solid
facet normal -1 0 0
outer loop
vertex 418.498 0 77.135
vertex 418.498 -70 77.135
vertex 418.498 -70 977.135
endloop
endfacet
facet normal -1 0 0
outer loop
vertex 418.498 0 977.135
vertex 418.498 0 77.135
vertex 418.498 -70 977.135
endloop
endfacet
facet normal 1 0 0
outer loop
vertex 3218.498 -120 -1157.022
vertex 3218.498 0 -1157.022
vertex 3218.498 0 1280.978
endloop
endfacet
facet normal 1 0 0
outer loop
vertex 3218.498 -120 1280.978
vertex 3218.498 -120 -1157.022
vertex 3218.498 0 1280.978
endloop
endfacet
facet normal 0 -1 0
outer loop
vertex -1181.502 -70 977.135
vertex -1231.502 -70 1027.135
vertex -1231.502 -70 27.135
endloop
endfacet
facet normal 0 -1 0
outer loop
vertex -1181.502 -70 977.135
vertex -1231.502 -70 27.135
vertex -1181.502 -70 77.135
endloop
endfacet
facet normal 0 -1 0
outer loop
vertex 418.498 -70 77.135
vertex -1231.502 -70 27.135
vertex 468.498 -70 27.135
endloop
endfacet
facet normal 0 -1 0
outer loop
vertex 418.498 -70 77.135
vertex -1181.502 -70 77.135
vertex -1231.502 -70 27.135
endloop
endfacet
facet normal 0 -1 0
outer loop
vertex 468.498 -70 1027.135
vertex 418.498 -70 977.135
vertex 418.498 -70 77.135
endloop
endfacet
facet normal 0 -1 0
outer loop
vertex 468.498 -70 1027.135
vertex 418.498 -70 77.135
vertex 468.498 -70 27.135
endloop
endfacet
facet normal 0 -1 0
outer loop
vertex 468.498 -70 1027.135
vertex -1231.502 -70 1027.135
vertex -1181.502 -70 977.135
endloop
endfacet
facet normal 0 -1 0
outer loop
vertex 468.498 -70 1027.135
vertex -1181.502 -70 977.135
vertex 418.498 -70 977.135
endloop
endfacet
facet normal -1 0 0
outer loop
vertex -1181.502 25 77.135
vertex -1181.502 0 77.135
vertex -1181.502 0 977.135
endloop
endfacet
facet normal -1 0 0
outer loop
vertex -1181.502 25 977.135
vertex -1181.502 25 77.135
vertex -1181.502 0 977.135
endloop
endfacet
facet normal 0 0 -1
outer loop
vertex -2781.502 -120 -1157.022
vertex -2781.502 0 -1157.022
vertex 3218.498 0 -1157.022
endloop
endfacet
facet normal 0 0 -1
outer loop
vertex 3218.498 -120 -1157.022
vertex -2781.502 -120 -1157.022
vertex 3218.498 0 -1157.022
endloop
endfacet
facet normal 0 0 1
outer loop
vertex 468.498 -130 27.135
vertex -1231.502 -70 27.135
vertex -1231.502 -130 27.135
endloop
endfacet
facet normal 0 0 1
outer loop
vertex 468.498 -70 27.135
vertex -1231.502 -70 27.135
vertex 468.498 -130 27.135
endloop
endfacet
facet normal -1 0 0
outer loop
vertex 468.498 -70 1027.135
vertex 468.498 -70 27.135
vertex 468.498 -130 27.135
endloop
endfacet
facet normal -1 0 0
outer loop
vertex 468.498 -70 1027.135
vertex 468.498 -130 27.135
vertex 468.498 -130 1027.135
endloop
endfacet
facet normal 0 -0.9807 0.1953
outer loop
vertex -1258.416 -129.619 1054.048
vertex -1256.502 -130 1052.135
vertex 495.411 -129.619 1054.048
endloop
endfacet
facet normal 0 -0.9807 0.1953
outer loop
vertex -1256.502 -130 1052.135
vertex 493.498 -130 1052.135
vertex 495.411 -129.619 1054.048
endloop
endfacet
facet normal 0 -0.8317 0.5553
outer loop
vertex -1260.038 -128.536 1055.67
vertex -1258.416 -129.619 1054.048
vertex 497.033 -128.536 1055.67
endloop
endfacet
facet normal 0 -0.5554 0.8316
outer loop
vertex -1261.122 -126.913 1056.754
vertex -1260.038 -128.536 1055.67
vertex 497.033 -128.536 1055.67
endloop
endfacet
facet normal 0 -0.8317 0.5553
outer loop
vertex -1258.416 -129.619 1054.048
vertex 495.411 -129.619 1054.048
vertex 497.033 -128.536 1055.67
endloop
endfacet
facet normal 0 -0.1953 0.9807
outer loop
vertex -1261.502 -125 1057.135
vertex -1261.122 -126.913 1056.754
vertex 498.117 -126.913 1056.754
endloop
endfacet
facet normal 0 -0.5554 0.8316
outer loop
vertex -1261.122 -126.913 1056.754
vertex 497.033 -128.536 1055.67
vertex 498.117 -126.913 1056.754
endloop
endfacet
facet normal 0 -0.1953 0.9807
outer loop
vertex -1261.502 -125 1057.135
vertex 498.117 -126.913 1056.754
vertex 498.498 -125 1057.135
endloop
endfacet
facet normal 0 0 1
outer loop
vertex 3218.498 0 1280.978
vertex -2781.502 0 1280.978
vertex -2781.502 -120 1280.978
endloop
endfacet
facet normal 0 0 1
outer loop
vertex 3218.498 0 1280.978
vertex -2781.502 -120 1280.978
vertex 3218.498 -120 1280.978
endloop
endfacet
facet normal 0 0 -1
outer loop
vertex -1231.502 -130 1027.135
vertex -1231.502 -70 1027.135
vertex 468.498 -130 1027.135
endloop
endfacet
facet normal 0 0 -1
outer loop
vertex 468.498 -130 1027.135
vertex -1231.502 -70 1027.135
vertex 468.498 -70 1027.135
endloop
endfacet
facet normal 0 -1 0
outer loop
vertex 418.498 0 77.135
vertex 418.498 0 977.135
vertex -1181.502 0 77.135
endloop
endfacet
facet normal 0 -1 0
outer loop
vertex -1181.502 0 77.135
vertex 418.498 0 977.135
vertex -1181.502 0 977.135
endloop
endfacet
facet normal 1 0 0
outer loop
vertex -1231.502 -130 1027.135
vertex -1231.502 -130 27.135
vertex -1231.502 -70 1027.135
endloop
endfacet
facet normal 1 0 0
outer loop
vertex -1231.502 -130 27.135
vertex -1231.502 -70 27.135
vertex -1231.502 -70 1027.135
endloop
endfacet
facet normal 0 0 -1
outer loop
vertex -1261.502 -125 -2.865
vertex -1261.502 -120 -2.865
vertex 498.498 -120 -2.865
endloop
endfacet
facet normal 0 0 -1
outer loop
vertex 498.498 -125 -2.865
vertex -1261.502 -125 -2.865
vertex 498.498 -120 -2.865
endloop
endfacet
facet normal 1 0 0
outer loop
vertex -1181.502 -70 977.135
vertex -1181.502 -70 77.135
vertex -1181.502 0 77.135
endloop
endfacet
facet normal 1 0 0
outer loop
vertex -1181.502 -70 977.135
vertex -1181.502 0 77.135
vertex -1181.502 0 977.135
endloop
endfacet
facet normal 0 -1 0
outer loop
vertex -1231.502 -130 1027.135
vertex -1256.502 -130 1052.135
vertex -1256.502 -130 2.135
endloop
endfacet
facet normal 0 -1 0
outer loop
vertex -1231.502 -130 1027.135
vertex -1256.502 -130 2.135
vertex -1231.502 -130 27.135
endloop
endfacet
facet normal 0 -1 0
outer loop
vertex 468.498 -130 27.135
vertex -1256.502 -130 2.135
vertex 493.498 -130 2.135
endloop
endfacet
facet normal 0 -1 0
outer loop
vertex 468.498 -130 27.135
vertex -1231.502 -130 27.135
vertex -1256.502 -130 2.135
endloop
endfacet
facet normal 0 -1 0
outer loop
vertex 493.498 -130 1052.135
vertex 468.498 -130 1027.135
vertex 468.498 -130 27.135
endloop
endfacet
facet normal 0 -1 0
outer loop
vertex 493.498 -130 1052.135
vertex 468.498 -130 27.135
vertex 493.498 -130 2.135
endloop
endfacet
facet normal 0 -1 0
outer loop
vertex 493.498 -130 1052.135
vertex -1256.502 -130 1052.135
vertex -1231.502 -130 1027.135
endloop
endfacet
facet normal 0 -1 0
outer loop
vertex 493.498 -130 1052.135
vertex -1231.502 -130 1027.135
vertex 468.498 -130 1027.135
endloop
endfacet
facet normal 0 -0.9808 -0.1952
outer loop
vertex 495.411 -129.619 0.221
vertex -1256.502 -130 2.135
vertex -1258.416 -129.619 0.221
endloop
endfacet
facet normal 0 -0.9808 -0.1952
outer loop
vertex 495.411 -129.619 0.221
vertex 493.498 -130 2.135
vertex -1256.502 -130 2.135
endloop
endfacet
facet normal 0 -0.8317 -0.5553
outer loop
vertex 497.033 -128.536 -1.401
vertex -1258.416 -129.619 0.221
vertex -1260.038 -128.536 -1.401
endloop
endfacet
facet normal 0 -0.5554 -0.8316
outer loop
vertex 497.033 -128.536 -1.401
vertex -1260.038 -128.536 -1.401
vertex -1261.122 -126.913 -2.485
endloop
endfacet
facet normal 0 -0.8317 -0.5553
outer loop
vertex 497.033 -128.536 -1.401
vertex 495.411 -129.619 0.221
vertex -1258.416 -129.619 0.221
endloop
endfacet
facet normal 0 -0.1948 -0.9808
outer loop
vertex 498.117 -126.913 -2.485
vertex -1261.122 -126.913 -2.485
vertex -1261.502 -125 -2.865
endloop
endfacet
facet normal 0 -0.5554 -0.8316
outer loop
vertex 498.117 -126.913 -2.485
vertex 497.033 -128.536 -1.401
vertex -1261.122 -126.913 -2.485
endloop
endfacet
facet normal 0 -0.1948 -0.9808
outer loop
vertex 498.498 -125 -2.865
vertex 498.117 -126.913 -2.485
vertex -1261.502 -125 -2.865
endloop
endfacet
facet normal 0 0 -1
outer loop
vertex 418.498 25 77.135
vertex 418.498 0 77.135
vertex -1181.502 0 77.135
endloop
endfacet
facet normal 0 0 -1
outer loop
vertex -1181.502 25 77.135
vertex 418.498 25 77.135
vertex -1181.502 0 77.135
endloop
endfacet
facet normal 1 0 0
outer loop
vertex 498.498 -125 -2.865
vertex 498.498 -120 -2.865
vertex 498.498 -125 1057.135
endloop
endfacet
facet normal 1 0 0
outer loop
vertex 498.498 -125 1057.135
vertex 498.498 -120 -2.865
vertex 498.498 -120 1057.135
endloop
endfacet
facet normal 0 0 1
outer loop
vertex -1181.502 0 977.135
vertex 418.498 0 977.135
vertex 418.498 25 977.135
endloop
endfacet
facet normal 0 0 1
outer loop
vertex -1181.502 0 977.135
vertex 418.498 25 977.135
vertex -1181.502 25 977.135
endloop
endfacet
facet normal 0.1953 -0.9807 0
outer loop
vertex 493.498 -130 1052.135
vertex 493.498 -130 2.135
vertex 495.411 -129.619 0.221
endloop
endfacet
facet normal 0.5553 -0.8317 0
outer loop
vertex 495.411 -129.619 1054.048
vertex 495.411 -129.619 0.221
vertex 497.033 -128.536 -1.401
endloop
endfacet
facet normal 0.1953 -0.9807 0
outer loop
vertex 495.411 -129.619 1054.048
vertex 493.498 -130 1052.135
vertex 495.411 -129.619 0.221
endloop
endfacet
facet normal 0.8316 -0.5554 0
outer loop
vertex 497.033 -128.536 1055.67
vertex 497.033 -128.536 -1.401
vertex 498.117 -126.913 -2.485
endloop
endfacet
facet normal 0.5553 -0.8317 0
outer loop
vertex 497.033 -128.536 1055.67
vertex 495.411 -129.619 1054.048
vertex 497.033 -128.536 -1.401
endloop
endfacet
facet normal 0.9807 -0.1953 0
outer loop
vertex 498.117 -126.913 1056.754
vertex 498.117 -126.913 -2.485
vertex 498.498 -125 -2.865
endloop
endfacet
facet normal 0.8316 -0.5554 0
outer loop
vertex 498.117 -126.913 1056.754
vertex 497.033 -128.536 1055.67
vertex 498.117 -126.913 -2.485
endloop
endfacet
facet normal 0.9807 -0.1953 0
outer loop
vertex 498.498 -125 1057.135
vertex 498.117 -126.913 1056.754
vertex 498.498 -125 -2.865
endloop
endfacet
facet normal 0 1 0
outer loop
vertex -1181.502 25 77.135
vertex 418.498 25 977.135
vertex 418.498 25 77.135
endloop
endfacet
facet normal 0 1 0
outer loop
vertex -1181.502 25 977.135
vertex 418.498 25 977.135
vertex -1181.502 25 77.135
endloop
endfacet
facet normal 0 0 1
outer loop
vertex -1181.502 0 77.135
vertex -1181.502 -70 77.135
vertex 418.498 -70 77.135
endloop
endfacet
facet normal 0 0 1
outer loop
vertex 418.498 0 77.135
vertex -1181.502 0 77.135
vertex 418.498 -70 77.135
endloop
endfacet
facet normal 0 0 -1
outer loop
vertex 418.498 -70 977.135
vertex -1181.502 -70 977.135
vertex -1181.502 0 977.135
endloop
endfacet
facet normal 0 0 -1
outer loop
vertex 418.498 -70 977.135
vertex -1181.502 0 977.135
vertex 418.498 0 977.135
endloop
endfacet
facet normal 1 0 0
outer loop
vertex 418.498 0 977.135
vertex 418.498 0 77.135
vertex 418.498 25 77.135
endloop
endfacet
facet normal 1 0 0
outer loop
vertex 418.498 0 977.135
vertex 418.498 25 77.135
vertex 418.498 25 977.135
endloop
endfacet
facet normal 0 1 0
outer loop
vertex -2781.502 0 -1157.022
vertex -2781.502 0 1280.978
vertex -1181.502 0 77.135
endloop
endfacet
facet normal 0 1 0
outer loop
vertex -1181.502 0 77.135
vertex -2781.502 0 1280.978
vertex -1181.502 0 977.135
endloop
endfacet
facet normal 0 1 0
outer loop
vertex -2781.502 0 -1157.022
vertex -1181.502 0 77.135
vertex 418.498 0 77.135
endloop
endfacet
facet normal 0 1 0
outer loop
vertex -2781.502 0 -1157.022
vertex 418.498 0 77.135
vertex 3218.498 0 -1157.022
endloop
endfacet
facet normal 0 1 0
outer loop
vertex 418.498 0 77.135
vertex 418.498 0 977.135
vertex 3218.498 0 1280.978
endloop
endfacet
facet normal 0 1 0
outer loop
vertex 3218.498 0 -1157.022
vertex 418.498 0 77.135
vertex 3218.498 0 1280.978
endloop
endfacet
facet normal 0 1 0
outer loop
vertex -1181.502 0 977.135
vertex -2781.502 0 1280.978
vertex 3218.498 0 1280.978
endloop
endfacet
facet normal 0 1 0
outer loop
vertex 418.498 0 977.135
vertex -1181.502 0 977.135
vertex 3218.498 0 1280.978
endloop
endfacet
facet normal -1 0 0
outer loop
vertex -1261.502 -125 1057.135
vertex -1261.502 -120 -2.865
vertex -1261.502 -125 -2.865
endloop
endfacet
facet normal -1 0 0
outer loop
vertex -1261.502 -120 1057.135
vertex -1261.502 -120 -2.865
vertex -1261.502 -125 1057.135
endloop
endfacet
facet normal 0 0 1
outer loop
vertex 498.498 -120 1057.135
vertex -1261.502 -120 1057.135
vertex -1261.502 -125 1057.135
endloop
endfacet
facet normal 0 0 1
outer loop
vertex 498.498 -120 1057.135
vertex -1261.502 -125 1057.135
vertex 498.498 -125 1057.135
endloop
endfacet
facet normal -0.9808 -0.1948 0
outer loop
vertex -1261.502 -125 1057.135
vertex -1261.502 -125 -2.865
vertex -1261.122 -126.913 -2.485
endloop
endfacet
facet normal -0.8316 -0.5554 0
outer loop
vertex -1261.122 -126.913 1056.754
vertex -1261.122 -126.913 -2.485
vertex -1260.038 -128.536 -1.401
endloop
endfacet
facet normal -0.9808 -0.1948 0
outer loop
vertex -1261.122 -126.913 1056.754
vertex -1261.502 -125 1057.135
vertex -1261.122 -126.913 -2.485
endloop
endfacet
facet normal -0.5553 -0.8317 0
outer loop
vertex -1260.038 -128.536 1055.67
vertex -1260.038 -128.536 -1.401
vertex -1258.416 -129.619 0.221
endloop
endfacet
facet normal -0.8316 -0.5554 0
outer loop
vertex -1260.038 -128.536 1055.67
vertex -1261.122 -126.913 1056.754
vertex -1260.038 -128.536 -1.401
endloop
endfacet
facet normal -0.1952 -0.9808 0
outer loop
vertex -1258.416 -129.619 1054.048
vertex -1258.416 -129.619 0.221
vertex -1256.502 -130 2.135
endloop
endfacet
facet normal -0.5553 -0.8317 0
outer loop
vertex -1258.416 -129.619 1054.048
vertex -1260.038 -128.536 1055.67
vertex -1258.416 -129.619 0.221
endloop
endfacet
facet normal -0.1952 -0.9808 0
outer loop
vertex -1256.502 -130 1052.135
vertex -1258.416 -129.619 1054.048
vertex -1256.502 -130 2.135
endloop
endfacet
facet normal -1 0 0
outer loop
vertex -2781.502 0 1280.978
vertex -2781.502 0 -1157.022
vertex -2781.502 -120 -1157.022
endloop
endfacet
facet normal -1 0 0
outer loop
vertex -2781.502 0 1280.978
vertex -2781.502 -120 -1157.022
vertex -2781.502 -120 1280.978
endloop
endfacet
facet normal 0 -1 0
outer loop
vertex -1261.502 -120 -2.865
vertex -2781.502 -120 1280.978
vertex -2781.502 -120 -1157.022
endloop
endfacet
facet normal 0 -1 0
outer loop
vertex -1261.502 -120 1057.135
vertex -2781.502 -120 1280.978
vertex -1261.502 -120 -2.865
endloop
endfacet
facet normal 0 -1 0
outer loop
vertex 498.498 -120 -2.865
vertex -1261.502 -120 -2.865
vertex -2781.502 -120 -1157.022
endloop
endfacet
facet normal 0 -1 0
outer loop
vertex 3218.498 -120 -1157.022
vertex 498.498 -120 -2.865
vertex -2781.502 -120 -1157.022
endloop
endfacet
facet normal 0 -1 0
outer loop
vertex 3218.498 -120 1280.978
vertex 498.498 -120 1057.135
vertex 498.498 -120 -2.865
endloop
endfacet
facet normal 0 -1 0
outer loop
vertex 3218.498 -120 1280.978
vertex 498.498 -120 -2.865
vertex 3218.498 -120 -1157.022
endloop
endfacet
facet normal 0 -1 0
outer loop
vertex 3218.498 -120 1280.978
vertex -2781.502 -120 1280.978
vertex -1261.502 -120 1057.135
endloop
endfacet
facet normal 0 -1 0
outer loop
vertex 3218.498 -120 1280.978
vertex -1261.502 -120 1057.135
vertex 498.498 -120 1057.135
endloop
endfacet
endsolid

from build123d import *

# Parameters (mm, degrees)
F0_W      = 6000
F0_H      = 2438
F1_DEPTH  = 120
F2_W      = 1600
F2_H      = 900
F3_DEPTH  = 120.001
F4_W      = 1700
F4_H      = 1000
F4_W_2    = 1600
F4_H_2    = 900
F5_DEPTH  = 50
F6_W      = 1760
F6_H      = 1060
F6_W_2    = 1700
F6_H_2    = 1000
F7_DEPTH  = 10
F8_R      = 5
F9_W      = 1600
F9_H      = 900
F10_DEPTH = 25


with BuildPart() as f1:
    # F0 (on Front) → F1 (new body)
    with BuildSketch(Plane.XZ):
        with Locations((218.497608, 61.978497)):
            Rectangle(F0_W, F0_H)
    extrude(amount=F1_DEPTH)

    # F2 (on face) → F3 (cut, through all)
    with BuildSketch(Plane.XZ.offset(120)):
        with Locations((-381.502392, 527.134765)):
            Rectangle(F2_W, F2_H)
    extrude(amount=-F3_DEPTH, mode=Mode.SUBTRACT)

    # F4 (on face) → F5 (cut)
    with BuildSketch(Plane.XZ.offset(120)):
        with Locations((-381.502392, 527.134765)):
            Rectangle(F4_W, F4_H)
        with Locations((-381.502392, 527.134765)):
            Rectangle(F4_W_2, F4_H_2, mode=Mode.SUBTRACT)
    extrude(amount=-F5_DEPTH, mode=Mode.SUBTRACT)

    # F6 (on face) → F7 (join)
    with BuildSketch(Plane.XZ.offset(120)):
        with Locations((-381.502392, 527.134765)):
            Rectangle(F6_W, F6_H)
        with Locations((-381.502392, 527.134765)):
            Rectangle(F6_W_2, F6_H_2, mode=Mode.SUBTRACT)
    extrude(amount=F7_DEPTH)

    # F8
    f8_edges = [f1.edges().sort_by_distance(p)[0] for p in [
        (-381.502392, -130, 1057.134765),
        (498.497608, -130, 527.134765),
        (-381.502392, -130, -2.865235),
        (-1261.502392, -130, 527.134765),
    ]]
    fillet(f8_edges, radius=F8_R)


with BuildPart() as f10:
    # F9 (on face) → F10 (new body)
    with BuildSketch(Plane(origin=(0, 0, 0), x_dir=(-1, 0, 0), z_dir=(0, 1, 0))):
        with Locations((381.502392, 527.134765)):
            Rectangle(F9_W, F9_H)
    extrude(amount=F10_DEPTH)


solid = Compound([f1.part, f10.part])
